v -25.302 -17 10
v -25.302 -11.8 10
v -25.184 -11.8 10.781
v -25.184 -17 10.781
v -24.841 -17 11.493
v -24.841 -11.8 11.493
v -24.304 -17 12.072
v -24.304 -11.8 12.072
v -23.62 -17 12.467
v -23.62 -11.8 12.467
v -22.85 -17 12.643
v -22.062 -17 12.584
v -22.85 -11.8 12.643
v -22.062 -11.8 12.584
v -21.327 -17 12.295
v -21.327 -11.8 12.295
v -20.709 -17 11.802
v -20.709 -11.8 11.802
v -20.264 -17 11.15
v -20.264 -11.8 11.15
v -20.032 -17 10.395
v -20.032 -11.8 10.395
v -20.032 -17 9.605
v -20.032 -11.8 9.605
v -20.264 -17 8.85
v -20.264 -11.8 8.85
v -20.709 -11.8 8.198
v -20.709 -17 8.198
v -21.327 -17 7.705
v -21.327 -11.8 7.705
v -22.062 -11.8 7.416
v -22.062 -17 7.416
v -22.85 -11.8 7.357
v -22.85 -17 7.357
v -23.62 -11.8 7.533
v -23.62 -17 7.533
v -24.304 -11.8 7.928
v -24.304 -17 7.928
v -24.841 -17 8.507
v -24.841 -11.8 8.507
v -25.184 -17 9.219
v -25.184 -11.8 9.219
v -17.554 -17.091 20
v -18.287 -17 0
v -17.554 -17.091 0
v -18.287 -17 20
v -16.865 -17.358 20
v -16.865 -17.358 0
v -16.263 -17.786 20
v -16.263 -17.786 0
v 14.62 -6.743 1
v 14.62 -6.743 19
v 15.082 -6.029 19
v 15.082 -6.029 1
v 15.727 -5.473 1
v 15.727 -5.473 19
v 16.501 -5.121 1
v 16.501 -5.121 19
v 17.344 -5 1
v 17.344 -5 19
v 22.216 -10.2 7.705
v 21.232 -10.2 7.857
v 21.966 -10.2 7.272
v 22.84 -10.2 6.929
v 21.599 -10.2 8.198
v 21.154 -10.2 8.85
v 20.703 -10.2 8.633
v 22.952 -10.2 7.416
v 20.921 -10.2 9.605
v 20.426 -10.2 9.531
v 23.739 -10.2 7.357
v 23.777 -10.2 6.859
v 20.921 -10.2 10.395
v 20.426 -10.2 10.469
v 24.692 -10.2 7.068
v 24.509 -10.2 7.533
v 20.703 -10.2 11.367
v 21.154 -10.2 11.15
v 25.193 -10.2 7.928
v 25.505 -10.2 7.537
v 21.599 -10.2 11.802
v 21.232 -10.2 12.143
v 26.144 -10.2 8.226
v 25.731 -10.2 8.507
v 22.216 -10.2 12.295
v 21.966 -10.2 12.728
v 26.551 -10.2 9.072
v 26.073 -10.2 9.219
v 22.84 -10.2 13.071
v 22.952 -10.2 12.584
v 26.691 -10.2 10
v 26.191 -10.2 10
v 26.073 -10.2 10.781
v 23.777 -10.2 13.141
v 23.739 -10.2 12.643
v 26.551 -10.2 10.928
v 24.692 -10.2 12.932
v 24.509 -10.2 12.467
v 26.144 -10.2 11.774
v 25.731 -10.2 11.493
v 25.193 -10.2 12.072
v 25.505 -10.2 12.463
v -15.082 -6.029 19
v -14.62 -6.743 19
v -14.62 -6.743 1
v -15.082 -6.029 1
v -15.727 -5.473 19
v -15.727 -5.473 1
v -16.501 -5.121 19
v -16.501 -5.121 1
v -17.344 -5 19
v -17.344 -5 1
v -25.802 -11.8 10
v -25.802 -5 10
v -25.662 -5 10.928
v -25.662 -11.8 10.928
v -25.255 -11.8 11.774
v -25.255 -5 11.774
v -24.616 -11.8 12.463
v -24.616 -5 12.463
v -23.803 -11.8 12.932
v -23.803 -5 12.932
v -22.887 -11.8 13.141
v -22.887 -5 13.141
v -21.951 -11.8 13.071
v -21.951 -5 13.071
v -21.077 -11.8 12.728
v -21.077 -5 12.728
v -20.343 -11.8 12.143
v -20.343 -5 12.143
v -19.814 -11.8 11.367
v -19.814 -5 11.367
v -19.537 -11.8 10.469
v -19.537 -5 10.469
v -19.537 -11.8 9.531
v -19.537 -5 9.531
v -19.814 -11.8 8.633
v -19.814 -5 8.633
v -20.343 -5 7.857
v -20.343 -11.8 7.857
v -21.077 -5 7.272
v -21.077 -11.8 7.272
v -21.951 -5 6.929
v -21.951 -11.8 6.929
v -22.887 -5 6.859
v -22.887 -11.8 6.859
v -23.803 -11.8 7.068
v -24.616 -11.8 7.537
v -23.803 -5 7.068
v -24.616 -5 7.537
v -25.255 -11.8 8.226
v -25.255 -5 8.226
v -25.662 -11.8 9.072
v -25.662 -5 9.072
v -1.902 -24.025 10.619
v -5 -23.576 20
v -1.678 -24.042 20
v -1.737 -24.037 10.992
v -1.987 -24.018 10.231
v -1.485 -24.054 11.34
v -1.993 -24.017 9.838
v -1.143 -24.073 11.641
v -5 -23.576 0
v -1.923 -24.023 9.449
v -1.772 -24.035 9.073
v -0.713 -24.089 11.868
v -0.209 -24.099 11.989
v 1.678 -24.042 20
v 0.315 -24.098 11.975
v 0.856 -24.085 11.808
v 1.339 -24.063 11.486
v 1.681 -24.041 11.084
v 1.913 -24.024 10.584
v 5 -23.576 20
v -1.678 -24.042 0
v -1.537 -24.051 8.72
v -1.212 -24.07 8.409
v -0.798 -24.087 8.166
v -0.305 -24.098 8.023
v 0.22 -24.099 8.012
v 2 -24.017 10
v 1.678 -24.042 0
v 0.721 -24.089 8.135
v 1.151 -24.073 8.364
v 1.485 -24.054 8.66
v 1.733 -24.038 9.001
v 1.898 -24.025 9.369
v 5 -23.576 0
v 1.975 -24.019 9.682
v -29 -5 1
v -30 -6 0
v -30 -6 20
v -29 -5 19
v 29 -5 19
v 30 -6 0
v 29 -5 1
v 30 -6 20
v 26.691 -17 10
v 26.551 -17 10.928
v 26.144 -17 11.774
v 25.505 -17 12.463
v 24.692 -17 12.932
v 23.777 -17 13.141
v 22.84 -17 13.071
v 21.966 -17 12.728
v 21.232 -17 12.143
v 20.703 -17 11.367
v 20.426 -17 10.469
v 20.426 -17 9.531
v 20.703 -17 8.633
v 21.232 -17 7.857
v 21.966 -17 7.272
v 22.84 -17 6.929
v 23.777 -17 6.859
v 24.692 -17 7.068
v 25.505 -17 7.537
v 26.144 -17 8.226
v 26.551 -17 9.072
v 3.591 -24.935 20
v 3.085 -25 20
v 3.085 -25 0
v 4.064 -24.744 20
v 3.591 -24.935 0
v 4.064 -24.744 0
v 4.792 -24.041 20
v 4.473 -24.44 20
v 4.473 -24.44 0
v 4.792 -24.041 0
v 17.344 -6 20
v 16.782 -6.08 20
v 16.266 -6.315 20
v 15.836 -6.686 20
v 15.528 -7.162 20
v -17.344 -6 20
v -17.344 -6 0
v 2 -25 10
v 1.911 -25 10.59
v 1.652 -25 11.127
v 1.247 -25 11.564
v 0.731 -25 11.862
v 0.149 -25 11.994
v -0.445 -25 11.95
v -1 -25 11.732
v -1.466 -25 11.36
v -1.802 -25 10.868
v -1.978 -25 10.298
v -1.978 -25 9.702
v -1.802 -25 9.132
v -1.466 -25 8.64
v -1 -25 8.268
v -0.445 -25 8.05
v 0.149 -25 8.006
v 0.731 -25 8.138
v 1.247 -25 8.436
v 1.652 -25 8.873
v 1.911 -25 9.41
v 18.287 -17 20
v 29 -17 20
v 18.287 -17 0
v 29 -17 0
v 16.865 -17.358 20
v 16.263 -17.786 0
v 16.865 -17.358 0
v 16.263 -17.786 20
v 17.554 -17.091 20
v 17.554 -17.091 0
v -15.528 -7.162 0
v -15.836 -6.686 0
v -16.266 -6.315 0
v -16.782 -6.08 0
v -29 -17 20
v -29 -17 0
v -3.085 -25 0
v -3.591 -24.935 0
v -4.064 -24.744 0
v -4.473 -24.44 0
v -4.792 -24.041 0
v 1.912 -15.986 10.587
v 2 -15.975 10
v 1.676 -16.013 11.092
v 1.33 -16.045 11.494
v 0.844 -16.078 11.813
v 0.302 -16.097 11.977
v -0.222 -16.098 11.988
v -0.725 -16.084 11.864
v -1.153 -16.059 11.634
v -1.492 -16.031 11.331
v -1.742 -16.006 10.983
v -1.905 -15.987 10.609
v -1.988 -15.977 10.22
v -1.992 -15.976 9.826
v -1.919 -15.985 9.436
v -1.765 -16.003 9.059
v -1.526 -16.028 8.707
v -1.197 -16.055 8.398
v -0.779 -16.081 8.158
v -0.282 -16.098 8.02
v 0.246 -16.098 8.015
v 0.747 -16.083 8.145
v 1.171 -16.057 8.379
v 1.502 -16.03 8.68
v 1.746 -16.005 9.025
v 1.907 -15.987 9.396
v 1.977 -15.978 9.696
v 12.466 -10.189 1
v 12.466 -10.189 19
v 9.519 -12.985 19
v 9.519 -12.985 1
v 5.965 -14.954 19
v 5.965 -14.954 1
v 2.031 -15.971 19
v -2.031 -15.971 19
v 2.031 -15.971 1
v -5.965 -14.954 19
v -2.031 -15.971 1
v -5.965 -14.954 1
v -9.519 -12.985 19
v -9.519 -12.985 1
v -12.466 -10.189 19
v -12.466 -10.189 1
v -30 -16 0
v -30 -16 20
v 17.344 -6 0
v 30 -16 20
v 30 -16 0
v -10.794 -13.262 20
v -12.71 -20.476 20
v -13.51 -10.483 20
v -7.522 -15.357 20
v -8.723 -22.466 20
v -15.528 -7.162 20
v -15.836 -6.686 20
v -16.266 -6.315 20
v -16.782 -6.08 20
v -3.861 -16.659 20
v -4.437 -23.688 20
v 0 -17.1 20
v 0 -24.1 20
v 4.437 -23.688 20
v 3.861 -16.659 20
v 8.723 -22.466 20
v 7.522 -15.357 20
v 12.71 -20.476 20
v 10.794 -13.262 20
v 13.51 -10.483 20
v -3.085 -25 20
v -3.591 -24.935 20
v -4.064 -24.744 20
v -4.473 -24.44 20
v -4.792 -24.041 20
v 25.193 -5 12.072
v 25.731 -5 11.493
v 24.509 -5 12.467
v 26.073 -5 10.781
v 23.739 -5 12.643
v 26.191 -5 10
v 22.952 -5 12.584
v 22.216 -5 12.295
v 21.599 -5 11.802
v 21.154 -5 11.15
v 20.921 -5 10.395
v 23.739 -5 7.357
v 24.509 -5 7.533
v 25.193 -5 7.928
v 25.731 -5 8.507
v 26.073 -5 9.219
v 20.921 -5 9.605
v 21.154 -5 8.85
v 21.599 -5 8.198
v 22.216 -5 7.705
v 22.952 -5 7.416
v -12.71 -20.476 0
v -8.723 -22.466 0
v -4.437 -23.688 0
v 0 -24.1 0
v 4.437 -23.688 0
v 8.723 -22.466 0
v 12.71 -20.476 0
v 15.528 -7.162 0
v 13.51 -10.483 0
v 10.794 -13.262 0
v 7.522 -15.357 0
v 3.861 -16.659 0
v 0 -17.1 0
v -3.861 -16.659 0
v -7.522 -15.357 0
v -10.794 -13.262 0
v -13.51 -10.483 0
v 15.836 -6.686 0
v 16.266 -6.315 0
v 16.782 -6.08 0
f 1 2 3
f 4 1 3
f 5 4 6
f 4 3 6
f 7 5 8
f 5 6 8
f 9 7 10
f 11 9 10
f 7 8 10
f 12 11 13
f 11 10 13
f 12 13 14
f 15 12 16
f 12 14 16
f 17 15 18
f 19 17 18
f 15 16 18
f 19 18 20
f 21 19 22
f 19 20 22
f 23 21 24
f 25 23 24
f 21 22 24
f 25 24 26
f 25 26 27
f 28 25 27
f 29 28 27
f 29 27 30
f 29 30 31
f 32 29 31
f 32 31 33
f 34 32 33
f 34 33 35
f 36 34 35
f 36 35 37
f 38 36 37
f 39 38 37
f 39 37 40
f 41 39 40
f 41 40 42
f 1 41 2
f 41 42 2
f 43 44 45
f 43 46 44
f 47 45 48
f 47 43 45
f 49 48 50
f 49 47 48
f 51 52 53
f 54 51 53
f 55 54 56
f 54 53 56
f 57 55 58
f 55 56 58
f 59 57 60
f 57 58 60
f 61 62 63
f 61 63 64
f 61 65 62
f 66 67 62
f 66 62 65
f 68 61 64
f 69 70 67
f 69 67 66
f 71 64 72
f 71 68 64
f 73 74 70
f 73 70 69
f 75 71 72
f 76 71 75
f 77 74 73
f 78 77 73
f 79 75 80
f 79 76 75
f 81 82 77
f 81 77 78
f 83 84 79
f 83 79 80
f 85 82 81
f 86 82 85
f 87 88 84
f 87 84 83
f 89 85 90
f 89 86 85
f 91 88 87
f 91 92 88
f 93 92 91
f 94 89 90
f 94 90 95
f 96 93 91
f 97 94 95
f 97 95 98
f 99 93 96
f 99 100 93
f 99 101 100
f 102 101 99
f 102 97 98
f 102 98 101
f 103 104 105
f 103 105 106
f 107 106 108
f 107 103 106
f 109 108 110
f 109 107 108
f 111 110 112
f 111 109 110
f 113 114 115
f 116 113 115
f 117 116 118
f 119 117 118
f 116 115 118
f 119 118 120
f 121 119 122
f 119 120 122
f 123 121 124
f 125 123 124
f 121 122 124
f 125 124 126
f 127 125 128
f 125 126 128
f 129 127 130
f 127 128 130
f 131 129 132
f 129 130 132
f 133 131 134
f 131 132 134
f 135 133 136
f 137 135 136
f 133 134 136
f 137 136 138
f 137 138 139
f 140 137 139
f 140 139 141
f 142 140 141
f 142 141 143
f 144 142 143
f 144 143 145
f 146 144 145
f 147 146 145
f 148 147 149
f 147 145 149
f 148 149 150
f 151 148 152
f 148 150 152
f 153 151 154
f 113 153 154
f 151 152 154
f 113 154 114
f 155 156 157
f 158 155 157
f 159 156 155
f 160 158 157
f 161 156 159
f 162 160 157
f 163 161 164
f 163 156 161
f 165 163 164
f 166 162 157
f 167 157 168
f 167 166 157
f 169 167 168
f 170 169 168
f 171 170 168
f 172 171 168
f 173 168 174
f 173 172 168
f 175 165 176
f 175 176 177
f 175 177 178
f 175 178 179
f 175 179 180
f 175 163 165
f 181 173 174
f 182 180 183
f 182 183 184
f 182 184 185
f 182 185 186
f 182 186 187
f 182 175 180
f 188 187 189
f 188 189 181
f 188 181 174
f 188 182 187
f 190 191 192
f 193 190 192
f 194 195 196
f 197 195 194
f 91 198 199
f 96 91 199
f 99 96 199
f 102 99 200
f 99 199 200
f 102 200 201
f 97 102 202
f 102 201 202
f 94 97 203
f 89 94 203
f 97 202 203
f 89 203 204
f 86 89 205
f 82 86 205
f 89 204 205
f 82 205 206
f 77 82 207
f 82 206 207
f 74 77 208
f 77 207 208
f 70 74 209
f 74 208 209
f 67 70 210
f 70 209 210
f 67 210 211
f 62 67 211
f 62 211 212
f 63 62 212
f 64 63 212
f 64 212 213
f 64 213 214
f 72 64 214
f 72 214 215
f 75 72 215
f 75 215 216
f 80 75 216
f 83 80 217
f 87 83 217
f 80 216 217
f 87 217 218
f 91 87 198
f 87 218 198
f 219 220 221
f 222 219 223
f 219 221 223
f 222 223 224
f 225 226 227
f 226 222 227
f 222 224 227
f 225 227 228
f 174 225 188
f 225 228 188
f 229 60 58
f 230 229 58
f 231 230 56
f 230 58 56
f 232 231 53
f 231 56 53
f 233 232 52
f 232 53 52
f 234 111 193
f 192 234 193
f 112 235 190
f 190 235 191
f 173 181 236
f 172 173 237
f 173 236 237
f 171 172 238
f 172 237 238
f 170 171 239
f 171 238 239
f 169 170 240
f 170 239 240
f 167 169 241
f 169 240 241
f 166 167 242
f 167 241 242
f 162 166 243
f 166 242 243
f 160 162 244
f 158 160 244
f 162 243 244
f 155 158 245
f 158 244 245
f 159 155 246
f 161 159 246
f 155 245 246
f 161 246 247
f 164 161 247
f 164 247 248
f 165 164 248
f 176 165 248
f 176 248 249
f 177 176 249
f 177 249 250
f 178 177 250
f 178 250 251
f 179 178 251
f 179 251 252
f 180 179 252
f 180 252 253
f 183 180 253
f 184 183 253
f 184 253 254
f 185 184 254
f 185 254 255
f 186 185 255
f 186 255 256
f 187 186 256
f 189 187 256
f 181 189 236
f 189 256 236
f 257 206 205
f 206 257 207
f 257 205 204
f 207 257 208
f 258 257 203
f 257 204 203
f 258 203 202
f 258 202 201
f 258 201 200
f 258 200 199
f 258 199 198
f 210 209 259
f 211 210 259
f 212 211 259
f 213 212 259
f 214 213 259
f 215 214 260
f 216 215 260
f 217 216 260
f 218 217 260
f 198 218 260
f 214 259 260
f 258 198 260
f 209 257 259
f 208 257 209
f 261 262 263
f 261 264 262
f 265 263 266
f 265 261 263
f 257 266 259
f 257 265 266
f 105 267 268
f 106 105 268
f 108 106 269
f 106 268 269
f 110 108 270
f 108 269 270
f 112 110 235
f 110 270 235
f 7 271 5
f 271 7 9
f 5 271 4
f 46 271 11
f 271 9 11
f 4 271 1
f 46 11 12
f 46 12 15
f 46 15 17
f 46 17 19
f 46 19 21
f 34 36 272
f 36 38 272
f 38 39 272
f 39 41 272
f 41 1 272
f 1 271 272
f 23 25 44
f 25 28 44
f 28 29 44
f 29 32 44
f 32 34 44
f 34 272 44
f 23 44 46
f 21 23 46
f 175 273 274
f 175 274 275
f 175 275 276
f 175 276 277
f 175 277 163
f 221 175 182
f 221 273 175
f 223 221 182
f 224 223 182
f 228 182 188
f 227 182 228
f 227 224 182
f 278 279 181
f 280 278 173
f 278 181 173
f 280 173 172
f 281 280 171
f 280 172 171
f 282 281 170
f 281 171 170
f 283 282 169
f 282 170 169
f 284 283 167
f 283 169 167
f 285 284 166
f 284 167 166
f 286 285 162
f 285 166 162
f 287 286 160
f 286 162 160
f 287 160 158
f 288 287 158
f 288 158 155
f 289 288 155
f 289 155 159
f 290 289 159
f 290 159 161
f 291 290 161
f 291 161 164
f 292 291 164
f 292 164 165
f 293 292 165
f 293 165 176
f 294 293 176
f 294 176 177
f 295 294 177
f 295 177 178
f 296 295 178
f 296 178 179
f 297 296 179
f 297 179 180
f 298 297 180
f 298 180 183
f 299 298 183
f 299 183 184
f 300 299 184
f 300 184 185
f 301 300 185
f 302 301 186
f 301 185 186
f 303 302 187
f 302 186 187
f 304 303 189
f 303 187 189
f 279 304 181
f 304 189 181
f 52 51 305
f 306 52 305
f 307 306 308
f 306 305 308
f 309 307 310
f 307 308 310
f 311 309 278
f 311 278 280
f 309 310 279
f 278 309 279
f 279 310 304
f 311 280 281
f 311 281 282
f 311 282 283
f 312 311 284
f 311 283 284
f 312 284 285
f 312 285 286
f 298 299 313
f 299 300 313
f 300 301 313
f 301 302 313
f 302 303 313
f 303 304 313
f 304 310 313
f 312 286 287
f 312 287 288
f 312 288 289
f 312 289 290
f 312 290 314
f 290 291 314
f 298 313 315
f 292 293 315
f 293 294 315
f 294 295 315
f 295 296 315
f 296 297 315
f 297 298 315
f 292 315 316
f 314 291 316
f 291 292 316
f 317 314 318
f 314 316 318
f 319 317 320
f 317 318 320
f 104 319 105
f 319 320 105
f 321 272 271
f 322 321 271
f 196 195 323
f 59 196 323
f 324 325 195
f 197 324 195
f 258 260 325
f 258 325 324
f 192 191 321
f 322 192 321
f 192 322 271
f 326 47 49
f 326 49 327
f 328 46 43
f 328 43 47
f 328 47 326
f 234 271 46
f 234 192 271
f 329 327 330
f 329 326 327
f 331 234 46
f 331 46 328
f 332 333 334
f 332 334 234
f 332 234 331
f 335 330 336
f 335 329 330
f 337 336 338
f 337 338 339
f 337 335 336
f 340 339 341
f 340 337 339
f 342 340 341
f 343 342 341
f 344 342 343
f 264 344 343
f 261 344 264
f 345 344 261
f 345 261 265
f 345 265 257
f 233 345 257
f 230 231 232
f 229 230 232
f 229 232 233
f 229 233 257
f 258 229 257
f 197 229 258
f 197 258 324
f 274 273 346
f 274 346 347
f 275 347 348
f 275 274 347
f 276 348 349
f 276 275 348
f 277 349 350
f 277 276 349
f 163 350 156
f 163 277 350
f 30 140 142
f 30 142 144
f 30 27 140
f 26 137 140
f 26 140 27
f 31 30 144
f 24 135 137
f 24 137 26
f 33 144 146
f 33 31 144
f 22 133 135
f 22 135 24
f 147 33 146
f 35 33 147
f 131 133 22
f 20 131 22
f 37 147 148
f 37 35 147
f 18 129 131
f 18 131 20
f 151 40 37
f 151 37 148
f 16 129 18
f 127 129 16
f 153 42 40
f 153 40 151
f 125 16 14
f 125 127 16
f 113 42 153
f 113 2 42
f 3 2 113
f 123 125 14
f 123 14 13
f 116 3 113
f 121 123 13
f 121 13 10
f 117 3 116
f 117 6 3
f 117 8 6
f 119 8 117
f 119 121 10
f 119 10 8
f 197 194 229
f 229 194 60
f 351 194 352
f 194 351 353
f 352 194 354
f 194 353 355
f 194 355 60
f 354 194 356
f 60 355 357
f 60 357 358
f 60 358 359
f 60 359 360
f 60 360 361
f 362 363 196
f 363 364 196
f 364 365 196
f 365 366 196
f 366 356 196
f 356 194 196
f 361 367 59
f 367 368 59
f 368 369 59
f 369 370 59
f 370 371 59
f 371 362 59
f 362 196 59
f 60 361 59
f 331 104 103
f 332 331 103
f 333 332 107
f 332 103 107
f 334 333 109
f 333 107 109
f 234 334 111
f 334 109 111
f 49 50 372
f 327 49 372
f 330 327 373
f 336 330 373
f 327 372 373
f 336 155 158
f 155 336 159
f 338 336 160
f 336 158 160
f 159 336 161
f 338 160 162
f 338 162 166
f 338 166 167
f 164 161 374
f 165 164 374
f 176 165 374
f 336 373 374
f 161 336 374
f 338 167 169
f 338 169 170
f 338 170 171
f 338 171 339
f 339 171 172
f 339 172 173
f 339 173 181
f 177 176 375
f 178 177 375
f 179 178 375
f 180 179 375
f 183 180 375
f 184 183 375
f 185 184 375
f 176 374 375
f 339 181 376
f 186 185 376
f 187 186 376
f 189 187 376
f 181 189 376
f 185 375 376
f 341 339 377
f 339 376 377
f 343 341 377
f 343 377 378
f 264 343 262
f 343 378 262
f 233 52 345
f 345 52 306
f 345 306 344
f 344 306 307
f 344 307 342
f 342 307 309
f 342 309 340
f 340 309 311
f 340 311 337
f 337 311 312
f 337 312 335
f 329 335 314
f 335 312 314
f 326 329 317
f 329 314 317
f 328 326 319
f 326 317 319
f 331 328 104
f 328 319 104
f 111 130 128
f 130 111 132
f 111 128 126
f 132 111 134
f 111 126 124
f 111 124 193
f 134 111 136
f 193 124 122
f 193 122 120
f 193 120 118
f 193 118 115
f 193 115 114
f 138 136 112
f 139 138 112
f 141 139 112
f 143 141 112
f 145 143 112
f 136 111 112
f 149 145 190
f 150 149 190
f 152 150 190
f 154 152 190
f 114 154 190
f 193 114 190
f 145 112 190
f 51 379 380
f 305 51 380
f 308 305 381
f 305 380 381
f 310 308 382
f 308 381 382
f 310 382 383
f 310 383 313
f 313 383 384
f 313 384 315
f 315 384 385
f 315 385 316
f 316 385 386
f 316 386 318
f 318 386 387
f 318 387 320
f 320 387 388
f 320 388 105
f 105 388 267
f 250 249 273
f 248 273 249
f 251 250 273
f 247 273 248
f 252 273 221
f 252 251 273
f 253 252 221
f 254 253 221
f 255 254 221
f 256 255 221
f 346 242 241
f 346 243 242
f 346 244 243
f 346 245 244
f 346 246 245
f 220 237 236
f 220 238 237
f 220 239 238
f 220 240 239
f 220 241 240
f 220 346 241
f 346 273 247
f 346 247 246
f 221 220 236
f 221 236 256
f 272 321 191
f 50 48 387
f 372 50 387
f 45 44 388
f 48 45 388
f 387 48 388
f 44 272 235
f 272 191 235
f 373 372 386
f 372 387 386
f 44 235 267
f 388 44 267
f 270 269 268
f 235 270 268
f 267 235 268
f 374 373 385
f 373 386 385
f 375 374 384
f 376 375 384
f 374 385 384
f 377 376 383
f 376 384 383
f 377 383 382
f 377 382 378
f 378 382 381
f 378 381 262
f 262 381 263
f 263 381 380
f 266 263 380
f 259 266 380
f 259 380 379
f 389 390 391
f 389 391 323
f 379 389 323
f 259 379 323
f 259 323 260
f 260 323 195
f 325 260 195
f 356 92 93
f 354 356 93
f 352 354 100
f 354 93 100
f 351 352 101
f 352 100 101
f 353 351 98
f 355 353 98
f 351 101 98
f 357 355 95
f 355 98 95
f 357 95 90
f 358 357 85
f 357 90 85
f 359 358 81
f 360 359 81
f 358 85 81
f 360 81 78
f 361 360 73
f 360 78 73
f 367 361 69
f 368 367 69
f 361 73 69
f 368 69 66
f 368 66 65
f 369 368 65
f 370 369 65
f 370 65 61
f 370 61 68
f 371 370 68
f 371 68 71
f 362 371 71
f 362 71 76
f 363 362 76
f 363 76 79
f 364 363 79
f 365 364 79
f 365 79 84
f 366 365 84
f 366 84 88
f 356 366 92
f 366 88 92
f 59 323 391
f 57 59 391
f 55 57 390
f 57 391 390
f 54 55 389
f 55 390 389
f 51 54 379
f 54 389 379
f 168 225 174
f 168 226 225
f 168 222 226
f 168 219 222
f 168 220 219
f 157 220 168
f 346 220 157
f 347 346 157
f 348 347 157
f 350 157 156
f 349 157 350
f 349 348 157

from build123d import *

# Parameters (mm, degrees)
F1_DEPTH     = 20
F2_R         = 3.15
F3_DEPTH     = 6.8
F4_R         = 2.65
F5_DEPTH     = 5.2
F6_R         = 3.15
F7_DEPTH     = 6.8
F8_R         = 2.65
F9_DEPTH     = 5.2
F13_R        = 2
F14_DEPTH    = 30
F15_R        = 3
F16_T1_DEPTH = 29.5768707806
F17_SIZE     = 1


# Not quite as in the source:
# - a fillet or chamfer that OpenCascade refuses, or shapes differently, is made with other operations: its cross-section is extruded or revolved along the edge and cut away or added


with BuildPart() as f1:
    # F0 (on Top) → F1 (new body)
    with BuildSketch(Plane.XY):
        with BuildLine():
            ThreePointArc((15.3039210662, -5), (0, -16.1), (-15.3039210662, -5))
            Line((-15.3039210662, -5), (-30, -5))
            Line((-30, -5), (-30, -17))
            Line((-30, -17), (-17.0824471315, -17))
            ThreePointArc((-17.0824471315, -17), (0, -24.1), (17.0824471315, -17))
            Line((17.0824471315, -17), (30, -17))
            Line((30, -17), (30, -5))
            Line((30, -5), (15.3039210662, -5))
        make_face()
    extrude(amount=F1_DEPTH)

    # F2 (on face) → F3 (cut)
    with BuildSketch(Plane.XZ.offset(17)):
        with Locations((23.5412235657, 10)):
            Circle(F2_R)
    extrude(amount=-F3_DEPTH, mode=Mode.SUBTRACT)

    # F4 (on face) → F5 (cut, through all)
    with BuildSketch(Plane.XZ.offset(10.2)):
        with Locations((23.5412235657, 10)):
            Circle(F4_R)
    extrude(amount=-F5_DEPTH, mode=Mode.SUBTRACT)

    # F6 (on face) → F7 (cut)
    with BuildSketch(Plane(origin=(0, -5, 0), x_dir=(-1, 0, 0), z_dir=(0, 1, 0))):
        with Locations((22.6519605331, 10)):
            Circle(F6_R)
    extrude(amount=-F7_DEPTH, mode=Mode.SUBTRACT)

    # F8 (on face) → F9 (cut, through all)
    with BuildSketch(Plane(origin=(0, -11.8, 0), x_dir=(-1, 0, 0), z_dir=(0, 1, 0))):
        with Locations((22.6519605331, 10)):
            Circle(F8_R)
    extrude(amount=-F9_DEPTH, mode=Mode.SUBTRACT)


with BuildPart() as f12:
    # F11 (on offset) → F12 (new body, up to the next surface of F1)
    with BuildSketch(Plane.XZ.offset(25)):
        Polygon((-5, 0), (0, 0), (5, 0), (5, 20), (-5, 20), align=None)
    extrude(until=Until.NEXT, target=f1.part, dir=(0, 1, 0))


with BuildPart() as f14_tool:
    # F13 (on face) → F14 (new body)
    with BuildSketch(Plane.XZ.offset(25)):
        with Locations((0, 10)):
            Circle(F13_R)
    extrude(amount=-F14_DEPTH)


with BuildPart() as f1_1:
    add(f1.part)

    # F14: cut by f14_tool
    add(f14_tool.part, mode=Mode.SUBTRACT)

    # F15
    f15_edges = [f1_1.edges().sort_by_distance(p)[0] for p in [
        (-15.303921, -5, 10),
        (15.303921, -5, 10),
        (-17.082447, -17, 10),
        (17.082447, -17, 10),
    ]]
    fillet(f15_edges, radius=F15_R)

    # F17
    f17_edges = [f1_1.edges().sort_by_distance(p)[0] for p in [
        (0, -16.1, 0),
        (-23.671937, -5, 20),
        (30, -17, 10),
        (-30, -17, 10),
        (-30, -5, 10),
        (30, -5, 10),
        (0, -16.1, 20),
        (15.726722, -5.473181, 0),
        (-15.726722, -5.473181, 0),
        (23.671937, -5, 0),
        (-23.671937, -5, 0),
        (15.726722, -5.473181, 20),
        (-15.726722, -5.473181, 20),
        (23.671937, -5, 20),
    ]]
    chamfer(f17_edges, length=F17_SIZE)


with BuildPart() as f12_1:
    add(f12.part)

    # F14: cut by f14_tool
    add(f14_tool.part, mode=Mode.SUBTRACT)

    # F16: fillet of radius 2 on 2 edges, made by hand

    # F16_s2 → F16_t1 (cut)
    with BuildSketch(Plane.XY.offset(-4.7884353903)):
        with BuildLine():
            ThreePointArc((-3.0846258439, -25), (-4.2780985066, -24.6048747625), (-5, -23.5756230034))
            Line((-5, -23.5756230034), (-5, -25))
            Line((-5, -25), (-3.0846258439, -25))
        make_face()
        with BuildLine():
            ThreePointArc((3.0846258439, -25), (4.2780985066, -24.6048747625), (5, -23.5756230034))
            Line((5, -23.5756230034), (5, -25))
            Line((5, -25), (3.0846258439, -25))
        make_face()
    extrude(amount=F16_T1_DEPTH, mode=Mode.SUBTRACT)


solid = Compound([f1_1.part, f12_1.part])
